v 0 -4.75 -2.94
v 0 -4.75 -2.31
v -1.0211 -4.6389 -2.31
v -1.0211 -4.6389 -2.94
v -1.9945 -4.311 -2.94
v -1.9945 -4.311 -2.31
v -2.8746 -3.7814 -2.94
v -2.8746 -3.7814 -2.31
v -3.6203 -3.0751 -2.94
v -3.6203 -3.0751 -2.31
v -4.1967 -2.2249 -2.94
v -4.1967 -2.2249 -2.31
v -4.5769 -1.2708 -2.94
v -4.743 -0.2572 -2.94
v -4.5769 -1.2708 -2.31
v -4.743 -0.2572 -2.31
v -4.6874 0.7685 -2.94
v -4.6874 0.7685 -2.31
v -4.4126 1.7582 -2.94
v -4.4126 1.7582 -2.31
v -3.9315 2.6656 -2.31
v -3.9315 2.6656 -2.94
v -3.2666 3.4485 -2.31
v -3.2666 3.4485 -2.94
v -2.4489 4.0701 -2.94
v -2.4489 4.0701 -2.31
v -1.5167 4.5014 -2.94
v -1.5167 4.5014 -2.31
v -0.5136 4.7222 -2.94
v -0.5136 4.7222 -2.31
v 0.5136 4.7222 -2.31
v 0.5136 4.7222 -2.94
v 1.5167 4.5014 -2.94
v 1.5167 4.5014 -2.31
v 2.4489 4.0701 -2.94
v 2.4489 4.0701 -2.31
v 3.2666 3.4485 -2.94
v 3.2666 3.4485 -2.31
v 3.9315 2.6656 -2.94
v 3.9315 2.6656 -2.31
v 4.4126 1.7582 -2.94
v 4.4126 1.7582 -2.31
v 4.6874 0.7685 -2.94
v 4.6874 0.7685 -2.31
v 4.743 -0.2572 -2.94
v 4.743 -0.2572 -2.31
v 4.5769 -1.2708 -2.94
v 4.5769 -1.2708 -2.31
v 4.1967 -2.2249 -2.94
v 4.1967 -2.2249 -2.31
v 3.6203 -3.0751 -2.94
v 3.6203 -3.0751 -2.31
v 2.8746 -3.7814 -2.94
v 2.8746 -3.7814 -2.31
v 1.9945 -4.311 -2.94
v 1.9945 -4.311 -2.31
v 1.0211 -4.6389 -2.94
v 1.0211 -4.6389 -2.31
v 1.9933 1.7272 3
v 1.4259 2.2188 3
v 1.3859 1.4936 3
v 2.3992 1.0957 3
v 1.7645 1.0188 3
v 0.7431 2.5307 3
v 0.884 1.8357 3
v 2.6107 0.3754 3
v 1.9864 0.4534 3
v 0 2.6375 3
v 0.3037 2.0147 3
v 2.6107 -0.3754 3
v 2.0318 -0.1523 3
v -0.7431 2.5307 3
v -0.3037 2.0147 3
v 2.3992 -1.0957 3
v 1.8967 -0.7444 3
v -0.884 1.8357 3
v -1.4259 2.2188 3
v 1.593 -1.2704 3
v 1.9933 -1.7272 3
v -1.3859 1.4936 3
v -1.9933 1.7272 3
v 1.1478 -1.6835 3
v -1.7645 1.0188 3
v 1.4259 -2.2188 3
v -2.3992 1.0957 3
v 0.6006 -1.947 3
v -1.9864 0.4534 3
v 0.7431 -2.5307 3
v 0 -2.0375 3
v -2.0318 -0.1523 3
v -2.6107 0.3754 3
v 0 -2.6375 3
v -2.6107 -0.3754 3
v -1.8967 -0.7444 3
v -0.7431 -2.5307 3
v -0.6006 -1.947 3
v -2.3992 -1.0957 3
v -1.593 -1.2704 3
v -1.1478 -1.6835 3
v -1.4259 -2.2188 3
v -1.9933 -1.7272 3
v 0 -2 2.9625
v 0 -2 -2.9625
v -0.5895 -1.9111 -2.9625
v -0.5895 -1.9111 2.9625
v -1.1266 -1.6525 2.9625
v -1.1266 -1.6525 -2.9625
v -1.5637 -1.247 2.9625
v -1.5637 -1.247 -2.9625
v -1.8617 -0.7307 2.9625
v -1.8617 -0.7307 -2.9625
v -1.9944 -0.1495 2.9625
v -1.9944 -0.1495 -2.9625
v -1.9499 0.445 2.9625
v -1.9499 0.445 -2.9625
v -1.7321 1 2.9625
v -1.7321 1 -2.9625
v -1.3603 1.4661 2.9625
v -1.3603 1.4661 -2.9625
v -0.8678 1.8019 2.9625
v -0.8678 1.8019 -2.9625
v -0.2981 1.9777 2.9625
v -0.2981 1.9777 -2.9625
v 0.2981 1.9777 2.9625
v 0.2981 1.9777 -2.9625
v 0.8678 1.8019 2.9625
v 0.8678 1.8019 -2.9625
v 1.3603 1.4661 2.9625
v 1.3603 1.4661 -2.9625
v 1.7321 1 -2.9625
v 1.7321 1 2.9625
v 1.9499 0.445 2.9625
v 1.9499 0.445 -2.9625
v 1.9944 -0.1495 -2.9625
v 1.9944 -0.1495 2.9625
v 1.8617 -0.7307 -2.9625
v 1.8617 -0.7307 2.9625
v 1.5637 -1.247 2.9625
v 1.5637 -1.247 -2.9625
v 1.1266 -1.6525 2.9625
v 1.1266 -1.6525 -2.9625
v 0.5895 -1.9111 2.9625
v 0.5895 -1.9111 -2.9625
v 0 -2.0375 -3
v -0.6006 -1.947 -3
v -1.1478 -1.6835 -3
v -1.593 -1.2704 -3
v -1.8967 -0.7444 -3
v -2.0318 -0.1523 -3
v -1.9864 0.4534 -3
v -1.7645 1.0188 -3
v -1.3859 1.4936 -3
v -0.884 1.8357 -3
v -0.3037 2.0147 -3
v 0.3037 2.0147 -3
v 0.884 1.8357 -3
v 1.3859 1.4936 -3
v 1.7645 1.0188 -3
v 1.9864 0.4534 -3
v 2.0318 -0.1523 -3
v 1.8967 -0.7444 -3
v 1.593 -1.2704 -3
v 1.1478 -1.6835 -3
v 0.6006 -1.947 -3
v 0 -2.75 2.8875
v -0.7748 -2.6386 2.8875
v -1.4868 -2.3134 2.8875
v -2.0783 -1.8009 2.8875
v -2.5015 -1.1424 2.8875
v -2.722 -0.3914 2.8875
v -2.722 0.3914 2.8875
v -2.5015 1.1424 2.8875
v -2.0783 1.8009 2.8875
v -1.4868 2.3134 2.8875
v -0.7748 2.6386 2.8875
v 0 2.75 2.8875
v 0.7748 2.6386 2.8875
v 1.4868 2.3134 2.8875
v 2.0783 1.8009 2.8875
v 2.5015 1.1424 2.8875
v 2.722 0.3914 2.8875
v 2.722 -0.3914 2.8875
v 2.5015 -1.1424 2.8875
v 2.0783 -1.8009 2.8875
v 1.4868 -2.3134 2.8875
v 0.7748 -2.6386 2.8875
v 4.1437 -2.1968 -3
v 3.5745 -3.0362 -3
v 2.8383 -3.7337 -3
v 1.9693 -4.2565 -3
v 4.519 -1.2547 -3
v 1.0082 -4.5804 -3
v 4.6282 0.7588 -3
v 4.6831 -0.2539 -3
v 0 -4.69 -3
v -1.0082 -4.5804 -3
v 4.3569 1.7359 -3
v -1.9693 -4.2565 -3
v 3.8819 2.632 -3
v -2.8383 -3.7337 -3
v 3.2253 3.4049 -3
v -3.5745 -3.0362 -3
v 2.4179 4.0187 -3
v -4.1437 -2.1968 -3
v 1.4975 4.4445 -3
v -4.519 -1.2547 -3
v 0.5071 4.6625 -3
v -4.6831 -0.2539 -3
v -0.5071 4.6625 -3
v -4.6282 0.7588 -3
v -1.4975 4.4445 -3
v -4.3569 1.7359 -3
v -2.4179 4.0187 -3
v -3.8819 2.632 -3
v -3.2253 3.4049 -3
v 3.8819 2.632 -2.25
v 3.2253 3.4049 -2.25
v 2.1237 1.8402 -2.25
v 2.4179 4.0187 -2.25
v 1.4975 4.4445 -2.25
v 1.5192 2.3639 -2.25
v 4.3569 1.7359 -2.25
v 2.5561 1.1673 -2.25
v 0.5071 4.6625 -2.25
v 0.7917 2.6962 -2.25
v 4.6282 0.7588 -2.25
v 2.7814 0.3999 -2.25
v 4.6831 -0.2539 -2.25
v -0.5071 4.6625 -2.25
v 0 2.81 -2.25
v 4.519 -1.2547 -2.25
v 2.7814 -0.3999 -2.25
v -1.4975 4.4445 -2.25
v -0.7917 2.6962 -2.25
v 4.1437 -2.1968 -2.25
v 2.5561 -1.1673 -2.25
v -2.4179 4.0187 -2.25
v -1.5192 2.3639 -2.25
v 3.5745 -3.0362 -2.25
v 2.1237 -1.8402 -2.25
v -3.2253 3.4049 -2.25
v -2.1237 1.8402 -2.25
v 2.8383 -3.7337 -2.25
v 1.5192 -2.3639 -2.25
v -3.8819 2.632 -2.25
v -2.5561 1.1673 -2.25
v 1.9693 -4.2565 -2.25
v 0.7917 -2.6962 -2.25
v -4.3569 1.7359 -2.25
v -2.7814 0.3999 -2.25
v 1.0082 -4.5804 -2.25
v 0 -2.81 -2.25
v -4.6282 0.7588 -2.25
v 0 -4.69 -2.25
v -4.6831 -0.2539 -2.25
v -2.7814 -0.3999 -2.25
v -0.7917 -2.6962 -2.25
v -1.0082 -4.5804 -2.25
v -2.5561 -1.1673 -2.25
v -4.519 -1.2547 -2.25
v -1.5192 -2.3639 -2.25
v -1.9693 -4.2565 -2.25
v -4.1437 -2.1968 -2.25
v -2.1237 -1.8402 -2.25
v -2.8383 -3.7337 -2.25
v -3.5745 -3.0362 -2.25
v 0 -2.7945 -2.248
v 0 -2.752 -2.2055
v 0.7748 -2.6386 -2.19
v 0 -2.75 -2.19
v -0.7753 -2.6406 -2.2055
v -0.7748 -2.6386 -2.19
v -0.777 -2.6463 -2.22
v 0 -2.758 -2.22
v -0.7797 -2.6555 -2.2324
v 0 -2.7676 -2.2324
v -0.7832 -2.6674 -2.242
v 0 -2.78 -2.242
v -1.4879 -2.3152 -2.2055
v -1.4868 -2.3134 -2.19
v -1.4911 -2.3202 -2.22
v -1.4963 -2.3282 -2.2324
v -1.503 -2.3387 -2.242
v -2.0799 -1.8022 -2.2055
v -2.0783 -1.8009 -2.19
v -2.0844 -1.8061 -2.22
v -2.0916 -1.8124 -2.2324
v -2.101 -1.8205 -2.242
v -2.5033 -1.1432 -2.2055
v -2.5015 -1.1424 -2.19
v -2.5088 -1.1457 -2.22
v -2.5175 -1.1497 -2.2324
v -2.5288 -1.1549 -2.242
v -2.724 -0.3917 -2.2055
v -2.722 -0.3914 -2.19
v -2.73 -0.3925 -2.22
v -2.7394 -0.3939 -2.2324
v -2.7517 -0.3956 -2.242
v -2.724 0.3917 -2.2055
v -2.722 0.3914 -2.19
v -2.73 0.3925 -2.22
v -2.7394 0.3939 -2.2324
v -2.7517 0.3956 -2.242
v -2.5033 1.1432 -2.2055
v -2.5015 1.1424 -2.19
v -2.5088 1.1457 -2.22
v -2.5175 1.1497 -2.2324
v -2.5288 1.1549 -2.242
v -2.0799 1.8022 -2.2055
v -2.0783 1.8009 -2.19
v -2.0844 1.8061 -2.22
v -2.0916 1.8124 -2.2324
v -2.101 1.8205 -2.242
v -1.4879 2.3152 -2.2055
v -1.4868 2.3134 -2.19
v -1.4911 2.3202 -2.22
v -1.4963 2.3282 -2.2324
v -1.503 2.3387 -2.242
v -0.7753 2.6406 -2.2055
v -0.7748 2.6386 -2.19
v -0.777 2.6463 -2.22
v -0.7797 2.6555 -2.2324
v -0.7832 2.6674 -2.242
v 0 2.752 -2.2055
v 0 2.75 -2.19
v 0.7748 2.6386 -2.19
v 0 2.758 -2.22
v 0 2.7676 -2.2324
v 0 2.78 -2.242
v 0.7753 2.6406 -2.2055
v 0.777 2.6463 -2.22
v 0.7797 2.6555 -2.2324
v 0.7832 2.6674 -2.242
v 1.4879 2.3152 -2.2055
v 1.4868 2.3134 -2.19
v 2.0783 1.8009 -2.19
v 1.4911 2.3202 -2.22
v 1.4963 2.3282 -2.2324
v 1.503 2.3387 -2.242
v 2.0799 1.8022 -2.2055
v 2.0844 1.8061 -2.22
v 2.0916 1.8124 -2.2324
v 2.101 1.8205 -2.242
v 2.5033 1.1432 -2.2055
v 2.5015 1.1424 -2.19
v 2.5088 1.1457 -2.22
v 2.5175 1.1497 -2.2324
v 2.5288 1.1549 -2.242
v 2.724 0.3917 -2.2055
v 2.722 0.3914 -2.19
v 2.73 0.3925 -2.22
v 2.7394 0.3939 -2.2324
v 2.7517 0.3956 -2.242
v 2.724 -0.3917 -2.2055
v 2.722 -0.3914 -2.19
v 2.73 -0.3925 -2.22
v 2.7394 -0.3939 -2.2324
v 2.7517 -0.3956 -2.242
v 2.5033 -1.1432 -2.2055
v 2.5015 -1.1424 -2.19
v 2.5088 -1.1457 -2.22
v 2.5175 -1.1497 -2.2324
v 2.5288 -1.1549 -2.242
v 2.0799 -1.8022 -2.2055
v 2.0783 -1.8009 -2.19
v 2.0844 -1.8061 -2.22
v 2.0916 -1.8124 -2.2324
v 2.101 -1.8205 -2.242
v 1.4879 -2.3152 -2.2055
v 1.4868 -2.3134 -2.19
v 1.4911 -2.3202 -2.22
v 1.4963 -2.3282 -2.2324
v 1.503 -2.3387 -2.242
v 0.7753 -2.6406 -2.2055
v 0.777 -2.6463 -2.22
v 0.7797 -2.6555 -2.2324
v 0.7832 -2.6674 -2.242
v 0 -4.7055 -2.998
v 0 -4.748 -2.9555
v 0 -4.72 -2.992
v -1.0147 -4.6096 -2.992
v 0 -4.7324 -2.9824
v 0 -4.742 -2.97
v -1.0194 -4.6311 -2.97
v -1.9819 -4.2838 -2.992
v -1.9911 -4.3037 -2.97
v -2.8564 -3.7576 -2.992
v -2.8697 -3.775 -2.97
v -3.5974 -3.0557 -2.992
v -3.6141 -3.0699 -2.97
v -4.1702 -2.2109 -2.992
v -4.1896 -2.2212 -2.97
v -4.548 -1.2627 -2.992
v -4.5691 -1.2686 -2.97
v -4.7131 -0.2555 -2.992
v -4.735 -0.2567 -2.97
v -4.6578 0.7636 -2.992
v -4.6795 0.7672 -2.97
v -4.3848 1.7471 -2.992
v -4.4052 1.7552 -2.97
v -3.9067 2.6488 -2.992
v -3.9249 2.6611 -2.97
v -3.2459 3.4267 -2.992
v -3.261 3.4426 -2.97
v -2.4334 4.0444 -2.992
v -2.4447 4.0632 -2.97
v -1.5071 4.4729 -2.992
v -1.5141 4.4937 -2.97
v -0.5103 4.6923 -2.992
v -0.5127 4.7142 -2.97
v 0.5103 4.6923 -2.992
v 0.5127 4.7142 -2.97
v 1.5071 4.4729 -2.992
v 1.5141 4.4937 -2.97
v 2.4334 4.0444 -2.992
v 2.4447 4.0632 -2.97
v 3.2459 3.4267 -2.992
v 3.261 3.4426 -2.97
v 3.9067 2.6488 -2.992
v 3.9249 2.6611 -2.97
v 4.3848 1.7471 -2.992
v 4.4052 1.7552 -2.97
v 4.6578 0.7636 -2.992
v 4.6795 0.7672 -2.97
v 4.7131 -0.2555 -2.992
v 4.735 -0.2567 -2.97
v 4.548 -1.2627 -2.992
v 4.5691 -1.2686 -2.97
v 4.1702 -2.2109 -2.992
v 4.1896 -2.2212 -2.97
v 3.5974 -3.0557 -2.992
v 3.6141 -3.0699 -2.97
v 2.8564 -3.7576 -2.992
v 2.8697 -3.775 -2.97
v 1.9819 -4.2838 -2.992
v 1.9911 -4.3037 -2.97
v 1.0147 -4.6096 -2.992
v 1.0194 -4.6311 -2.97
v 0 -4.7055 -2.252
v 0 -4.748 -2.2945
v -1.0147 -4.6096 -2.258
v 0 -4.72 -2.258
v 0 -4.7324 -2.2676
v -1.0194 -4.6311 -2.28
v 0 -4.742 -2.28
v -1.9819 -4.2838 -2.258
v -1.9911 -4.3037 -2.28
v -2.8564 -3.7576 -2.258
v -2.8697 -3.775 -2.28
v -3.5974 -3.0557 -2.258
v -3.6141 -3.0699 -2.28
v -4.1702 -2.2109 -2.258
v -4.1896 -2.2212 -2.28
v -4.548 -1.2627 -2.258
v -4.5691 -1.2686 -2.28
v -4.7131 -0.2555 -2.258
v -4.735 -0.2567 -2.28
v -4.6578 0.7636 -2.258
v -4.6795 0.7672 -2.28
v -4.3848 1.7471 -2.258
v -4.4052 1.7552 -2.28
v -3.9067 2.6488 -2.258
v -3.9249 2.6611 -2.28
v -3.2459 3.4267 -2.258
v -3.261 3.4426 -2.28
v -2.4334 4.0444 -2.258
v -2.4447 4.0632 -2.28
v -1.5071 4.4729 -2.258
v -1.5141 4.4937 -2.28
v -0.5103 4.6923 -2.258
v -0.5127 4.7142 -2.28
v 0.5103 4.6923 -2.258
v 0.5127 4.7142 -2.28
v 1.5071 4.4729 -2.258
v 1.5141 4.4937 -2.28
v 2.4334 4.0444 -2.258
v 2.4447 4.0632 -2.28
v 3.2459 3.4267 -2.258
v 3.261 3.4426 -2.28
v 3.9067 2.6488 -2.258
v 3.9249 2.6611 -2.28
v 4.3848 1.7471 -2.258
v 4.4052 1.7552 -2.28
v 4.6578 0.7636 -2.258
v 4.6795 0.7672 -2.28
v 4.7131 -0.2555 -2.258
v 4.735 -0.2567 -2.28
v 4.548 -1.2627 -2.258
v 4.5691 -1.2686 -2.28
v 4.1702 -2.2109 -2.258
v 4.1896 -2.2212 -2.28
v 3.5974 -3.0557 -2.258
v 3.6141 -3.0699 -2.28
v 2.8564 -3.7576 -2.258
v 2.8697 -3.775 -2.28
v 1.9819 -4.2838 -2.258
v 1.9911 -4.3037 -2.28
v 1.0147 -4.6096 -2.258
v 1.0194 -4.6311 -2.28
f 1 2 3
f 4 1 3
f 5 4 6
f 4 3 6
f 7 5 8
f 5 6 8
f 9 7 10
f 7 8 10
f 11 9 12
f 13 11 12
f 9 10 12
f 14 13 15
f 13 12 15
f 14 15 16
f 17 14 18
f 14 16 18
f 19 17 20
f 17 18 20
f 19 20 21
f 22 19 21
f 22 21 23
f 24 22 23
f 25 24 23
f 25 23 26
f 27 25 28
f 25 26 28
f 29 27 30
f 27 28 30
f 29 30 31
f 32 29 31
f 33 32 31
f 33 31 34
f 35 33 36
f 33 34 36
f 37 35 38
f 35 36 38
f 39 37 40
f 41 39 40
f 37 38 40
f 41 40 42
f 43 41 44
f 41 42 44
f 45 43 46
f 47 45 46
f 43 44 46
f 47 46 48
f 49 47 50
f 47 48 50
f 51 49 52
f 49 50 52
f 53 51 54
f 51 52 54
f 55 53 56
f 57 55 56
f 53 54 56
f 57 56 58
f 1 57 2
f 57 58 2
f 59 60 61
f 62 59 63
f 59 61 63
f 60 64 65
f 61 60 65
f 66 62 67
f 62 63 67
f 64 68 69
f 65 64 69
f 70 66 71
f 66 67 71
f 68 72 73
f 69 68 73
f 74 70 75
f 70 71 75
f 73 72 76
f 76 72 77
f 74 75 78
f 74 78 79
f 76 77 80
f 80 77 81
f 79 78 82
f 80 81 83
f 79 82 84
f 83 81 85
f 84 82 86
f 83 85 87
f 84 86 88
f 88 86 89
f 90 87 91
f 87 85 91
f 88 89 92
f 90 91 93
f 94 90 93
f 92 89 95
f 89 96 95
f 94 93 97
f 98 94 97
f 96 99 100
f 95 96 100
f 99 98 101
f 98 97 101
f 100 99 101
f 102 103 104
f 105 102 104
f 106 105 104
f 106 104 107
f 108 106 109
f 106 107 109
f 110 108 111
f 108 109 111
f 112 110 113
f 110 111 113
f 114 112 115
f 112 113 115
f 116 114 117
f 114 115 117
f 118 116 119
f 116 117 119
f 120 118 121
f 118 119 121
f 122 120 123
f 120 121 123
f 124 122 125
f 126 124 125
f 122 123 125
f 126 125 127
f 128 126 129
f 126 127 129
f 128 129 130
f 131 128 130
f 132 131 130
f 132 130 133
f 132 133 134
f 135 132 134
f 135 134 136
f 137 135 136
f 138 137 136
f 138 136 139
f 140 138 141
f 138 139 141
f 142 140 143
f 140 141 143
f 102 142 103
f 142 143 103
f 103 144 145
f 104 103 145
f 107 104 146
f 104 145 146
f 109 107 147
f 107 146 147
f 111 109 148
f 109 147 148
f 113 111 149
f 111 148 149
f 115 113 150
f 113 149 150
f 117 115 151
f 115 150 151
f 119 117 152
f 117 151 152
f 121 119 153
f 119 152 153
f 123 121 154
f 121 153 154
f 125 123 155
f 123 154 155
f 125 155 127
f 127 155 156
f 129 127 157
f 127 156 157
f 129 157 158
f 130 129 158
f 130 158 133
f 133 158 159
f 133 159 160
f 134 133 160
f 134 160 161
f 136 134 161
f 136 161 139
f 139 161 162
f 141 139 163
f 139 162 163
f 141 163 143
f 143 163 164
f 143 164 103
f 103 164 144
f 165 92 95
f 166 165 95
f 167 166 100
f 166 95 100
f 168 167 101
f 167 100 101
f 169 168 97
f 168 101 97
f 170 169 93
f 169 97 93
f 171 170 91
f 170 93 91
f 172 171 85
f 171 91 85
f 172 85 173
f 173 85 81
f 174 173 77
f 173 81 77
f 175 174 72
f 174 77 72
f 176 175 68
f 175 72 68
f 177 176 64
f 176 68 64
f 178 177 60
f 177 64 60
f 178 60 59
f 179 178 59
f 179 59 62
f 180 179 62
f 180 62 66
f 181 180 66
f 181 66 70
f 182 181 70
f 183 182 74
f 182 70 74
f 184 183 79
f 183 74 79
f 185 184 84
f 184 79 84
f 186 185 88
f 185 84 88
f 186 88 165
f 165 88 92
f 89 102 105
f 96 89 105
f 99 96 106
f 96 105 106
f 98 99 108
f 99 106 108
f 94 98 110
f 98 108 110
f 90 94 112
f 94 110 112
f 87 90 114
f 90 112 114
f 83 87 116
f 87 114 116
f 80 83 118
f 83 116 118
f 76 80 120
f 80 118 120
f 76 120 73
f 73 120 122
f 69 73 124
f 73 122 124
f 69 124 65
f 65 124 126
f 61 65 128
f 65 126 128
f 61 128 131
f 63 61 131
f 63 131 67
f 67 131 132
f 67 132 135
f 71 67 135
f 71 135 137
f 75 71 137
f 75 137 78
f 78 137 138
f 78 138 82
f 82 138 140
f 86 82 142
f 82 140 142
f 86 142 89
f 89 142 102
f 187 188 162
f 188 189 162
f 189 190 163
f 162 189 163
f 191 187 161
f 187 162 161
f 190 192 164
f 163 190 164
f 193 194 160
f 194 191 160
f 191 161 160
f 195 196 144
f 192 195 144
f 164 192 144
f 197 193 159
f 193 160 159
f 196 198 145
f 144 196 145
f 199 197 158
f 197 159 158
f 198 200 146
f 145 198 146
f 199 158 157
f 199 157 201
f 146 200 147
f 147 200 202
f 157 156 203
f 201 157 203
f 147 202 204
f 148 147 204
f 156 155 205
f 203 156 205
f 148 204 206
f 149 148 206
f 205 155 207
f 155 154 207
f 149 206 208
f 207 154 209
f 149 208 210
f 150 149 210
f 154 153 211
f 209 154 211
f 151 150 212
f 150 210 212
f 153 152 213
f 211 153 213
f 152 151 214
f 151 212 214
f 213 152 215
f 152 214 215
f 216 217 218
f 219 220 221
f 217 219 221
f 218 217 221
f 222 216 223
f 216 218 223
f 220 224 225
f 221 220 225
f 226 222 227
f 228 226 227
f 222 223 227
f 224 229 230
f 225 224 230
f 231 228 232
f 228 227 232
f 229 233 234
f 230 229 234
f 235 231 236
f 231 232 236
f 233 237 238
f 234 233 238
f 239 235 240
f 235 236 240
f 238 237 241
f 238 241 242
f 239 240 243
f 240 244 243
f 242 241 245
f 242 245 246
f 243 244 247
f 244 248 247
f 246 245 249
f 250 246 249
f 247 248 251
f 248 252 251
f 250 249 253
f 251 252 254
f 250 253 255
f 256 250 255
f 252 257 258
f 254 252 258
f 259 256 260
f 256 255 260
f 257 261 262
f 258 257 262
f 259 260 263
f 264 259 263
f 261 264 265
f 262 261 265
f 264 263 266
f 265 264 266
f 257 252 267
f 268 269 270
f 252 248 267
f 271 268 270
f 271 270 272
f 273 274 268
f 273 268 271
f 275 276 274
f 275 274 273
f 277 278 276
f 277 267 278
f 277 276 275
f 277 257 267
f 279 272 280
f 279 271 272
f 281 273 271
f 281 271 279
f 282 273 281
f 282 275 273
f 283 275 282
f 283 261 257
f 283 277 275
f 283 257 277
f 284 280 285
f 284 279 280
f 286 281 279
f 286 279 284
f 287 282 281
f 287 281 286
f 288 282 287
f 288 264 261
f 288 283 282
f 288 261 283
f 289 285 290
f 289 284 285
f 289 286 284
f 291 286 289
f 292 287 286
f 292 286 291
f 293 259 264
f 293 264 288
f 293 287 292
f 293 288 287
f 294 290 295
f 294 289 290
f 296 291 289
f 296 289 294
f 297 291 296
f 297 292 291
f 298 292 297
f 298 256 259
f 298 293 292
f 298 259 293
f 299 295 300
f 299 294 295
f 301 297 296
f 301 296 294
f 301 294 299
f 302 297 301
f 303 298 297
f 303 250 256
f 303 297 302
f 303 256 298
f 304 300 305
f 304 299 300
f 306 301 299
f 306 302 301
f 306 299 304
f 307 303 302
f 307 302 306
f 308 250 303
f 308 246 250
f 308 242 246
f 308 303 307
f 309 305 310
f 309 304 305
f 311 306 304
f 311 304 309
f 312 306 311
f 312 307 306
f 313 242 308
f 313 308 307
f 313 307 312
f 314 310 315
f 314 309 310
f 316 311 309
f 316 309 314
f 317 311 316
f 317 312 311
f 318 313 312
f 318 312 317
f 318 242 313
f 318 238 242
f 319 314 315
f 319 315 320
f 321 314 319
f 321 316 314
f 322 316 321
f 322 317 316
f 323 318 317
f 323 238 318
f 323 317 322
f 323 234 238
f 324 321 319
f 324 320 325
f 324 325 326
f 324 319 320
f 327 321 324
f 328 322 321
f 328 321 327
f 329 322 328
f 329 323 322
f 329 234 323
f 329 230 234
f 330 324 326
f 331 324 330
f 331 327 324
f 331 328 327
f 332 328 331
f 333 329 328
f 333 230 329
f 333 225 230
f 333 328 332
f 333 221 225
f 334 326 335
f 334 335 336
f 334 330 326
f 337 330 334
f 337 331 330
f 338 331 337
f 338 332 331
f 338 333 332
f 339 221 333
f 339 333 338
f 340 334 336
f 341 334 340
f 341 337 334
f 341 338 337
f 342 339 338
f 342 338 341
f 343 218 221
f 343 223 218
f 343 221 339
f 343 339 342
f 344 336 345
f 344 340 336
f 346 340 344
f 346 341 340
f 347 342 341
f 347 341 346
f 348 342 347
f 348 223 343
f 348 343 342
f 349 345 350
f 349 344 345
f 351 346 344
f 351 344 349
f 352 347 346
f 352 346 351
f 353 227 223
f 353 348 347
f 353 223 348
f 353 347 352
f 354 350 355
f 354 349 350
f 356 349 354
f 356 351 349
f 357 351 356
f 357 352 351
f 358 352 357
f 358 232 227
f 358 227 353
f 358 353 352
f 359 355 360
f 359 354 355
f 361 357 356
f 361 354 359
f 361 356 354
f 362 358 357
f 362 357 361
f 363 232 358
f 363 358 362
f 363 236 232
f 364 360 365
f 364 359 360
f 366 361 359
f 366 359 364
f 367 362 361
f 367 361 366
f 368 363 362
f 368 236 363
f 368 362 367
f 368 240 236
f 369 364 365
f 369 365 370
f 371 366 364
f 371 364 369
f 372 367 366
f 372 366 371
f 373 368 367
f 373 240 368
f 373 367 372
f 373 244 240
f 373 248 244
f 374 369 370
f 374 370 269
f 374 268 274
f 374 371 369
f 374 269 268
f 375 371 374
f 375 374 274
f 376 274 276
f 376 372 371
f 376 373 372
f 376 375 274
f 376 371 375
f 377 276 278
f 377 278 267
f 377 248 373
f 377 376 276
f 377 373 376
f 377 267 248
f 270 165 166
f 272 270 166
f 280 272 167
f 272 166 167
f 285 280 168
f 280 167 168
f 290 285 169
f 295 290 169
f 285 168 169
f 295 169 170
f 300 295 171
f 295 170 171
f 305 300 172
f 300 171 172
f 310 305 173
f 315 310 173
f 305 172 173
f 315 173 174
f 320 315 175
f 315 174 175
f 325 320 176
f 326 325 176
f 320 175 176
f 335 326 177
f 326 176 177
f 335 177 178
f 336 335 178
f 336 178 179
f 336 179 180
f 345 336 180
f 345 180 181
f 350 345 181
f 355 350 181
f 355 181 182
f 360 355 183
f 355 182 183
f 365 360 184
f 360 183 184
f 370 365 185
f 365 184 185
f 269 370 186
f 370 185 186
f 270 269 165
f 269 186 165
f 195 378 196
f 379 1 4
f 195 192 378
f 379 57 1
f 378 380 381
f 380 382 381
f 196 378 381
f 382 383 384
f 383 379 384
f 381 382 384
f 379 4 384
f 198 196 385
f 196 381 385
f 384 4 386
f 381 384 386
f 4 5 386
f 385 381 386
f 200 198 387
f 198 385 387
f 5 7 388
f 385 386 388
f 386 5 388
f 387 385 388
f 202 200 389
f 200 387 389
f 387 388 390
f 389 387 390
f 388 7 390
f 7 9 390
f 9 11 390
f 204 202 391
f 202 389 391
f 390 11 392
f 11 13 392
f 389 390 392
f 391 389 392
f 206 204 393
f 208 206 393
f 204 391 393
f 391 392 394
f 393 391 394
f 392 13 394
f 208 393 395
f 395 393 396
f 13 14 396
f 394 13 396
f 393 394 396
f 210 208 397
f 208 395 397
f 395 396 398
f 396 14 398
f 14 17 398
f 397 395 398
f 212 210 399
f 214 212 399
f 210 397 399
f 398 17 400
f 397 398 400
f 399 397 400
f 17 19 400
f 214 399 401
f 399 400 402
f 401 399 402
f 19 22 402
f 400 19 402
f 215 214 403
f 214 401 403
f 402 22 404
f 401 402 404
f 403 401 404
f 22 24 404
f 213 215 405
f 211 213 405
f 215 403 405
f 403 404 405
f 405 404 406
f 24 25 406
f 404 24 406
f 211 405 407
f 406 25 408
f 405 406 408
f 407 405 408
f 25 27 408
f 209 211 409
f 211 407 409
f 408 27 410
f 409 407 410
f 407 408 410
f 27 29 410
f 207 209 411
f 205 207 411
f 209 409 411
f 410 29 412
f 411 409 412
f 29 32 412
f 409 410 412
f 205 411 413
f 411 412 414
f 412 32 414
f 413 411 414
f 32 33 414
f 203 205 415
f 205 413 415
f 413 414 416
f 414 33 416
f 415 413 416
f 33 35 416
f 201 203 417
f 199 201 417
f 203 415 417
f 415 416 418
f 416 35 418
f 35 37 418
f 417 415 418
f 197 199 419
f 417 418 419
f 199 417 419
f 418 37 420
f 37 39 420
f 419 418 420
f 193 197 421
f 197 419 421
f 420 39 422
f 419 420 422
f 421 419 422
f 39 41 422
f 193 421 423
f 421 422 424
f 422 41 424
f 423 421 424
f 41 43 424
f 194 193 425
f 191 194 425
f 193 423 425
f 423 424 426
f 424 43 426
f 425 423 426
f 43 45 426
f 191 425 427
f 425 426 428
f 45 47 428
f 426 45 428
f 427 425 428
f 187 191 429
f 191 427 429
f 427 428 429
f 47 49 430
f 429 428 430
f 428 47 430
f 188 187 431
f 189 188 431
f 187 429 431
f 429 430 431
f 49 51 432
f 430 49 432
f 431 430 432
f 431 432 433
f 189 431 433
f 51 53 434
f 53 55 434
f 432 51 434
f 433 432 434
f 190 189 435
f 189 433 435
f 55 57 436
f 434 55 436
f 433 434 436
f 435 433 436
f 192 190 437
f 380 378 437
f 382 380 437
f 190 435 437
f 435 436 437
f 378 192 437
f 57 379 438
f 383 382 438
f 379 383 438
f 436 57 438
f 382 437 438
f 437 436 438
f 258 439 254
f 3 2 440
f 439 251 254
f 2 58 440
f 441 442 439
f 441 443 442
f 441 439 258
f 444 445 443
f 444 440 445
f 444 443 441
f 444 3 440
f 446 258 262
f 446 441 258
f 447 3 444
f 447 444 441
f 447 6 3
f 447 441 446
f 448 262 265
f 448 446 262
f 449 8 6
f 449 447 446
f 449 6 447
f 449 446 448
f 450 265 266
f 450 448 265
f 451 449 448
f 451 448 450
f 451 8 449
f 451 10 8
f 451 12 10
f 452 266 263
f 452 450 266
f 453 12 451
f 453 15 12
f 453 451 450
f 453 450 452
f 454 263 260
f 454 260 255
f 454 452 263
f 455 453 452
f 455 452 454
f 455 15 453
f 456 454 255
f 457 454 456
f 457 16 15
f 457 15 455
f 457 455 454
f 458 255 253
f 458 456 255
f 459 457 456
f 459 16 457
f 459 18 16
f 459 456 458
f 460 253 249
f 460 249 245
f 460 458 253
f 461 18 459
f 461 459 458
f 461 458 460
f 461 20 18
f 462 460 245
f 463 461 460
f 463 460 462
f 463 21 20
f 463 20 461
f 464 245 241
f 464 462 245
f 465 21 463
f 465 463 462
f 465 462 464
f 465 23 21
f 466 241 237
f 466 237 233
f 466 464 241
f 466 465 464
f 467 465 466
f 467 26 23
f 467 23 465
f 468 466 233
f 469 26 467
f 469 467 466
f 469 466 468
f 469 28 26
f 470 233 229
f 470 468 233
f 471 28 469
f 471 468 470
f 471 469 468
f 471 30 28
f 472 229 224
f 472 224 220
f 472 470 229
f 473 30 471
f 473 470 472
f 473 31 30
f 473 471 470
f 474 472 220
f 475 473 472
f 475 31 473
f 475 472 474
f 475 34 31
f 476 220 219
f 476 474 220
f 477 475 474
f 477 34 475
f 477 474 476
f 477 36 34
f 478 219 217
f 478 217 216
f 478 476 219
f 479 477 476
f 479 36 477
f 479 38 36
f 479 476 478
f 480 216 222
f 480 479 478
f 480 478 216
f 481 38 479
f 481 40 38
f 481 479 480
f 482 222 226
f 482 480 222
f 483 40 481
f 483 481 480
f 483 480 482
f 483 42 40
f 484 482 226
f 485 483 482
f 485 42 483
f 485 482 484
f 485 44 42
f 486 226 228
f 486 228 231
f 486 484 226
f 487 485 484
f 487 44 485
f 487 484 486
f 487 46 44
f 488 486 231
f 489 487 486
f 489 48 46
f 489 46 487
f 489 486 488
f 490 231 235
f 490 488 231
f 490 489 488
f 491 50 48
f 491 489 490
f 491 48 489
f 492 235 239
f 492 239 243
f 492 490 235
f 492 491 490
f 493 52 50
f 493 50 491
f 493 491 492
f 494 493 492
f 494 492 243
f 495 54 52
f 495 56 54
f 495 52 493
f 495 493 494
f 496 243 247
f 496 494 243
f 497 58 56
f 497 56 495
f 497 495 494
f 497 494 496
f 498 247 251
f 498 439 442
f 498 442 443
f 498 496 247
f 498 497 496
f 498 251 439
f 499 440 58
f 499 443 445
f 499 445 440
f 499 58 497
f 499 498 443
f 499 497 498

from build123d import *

# Parameters (mm, degrees)
CHAMFER1_SIZE = 0.1125
CHAMFER2_SIZE = 0.0375
FILLET1_R     = 0.06


with BuildPart() as part:
    # Sketch3 → Revolve1 (revolve)
    with BuildSketch(Plane(origin=(0, 0, 0), x_dir=(0, 0, -1), z_dir=(1, 0, 0))):
        Polygon((3, -4.75), (2.25, -4.75), (2.25, -2.75), (-3, -2.75), (-3, -2), (3, -2), align=None)
    revolve(axis=Axis((0, 0, 3), (0, 0, -1)))

    # Chamfer1
    chamfer1_edges = [part.edges().sort_by_distance(p)[0] for p in [
        (0, 2.75, 3),
    ]]
    chamfer(chamfer1_edges, length=CHAMFER1_SIZE)

    # Chamfer2
    chamfer2_edges = [part.edges().sort_by_distance(p)[0] for p in [
        (0, 2, -3),
        (0, 2, 3),
    ]]
    chamfer(chamfer2_edges, length=CHAMFER2_SIZE)

    # Fillet1
    fillet1_edges = [part.edges().sort_by_distance(p)[0] for p in [
        (0, 2.75, -2.25),
        (0, 4.75, -2.25),
        (0, 4.75, -3),
    ]]
    fillet(fillet1_edges, radius=FILLET1_R)


solid = part.part
